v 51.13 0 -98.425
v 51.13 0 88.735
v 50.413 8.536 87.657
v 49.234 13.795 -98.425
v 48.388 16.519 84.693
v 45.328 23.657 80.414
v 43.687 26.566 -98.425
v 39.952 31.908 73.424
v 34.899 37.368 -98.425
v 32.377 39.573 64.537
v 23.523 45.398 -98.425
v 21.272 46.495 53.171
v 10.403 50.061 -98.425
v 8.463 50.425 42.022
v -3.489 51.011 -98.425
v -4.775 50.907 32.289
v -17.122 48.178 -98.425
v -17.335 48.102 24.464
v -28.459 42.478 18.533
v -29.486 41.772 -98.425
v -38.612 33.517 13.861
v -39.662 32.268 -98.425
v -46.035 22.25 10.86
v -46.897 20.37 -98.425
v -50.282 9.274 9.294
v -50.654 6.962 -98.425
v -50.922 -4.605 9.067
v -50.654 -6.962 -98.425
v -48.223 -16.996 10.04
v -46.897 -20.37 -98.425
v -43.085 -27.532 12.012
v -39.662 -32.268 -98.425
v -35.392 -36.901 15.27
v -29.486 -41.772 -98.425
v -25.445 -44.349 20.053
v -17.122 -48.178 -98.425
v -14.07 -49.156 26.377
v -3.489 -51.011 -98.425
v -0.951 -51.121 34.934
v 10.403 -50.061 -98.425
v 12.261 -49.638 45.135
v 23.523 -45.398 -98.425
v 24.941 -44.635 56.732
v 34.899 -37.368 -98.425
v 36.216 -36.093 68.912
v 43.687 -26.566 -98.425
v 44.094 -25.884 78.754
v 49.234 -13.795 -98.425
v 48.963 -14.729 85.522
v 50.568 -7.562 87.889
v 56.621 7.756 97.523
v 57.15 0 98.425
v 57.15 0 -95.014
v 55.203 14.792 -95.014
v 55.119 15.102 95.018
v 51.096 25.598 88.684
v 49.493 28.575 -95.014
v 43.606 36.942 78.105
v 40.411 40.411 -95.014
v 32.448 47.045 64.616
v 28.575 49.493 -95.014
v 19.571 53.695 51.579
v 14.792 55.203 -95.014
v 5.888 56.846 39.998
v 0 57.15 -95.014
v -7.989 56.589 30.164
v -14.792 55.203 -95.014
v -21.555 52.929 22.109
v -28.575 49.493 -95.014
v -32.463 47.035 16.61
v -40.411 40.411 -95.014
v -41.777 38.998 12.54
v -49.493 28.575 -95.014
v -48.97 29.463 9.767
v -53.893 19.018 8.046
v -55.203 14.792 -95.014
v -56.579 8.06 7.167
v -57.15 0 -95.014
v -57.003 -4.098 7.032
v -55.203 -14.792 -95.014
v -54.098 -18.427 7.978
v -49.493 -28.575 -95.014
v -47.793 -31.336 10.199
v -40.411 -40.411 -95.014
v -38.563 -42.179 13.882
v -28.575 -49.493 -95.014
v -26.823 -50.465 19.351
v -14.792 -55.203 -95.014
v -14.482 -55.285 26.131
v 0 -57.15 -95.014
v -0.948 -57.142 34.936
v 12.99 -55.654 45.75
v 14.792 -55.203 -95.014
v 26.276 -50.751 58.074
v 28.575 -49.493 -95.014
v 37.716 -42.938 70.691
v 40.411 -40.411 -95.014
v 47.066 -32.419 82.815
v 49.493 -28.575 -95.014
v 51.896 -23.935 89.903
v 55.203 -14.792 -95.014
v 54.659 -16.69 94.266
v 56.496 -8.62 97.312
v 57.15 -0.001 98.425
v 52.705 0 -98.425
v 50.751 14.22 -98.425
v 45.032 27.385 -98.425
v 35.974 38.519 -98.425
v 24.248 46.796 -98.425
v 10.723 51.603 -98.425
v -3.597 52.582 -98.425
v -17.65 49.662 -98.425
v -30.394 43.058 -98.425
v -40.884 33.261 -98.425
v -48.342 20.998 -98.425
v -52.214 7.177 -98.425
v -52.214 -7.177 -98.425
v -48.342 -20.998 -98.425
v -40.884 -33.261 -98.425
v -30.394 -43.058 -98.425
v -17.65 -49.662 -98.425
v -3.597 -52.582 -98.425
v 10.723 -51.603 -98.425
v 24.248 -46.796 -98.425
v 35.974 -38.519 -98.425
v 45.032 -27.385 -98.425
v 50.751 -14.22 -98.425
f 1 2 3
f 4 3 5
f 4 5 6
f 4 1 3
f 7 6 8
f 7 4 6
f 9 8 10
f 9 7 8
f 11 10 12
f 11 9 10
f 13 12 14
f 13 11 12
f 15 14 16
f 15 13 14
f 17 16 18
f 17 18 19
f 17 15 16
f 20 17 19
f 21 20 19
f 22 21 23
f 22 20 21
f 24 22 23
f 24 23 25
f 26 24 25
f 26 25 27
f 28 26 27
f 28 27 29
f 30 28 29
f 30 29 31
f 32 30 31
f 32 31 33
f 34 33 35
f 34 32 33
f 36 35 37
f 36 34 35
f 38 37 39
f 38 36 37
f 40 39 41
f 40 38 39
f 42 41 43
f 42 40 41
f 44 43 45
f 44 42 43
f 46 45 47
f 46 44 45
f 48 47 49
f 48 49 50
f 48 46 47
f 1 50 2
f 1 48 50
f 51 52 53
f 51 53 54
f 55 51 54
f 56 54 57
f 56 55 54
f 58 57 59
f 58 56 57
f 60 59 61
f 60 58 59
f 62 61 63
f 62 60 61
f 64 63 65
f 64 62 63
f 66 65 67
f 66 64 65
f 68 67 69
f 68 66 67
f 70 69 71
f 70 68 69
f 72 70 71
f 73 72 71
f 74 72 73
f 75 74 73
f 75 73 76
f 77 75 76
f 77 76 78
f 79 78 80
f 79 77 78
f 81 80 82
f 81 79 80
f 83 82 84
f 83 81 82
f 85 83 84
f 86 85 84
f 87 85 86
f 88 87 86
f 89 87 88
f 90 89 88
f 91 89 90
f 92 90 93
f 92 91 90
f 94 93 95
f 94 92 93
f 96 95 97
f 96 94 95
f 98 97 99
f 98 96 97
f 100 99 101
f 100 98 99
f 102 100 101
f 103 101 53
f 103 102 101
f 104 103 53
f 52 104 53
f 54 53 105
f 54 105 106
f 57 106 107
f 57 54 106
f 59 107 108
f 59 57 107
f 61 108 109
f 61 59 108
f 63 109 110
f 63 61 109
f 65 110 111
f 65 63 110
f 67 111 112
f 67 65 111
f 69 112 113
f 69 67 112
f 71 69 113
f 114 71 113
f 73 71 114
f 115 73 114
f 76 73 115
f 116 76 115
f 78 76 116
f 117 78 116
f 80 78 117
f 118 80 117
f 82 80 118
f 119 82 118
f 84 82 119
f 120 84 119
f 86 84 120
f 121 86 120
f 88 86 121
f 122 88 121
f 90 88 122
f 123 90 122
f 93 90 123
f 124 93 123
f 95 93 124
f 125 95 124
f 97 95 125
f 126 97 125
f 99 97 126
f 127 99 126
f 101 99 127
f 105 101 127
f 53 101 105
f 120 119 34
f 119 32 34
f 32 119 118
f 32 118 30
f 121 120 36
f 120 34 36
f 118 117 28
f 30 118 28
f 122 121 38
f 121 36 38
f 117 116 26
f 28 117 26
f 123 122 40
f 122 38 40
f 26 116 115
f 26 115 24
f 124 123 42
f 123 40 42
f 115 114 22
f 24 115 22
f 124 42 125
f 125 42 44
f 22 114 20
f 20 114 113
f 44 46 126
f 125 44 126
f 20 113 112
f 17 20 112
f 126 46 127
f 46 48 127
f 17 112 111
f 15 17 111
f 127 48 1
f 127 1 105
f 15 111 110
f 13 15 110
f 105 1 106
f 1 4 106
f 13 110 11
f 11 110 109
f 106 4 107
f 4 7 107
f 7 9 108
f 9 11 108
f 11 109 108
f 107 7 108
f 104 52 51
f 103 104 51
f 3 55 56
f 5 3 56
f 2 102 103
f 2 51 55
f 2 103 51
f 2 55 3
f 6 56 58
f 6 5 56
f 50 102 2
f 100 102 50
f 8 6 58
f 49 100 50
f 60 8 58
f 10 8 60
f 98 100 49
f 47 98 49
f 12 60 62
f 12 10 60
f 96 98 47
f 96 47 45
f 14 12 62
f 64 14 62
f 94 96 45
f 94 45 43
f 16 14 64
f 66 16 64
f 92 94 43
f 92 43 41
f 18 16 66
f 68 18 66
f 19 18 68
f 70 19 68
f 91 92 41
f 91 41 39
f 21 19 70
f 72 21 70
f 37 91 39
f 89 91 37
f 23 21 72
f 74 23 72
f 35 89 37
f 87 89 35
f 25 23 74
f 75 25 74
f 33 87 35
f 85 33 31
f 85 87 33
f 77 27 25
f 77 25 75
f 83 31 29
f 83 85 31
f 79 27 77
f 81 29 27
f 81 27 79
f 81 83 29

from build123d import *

# Parameters (mm, degrees)
SKETCH1_R               = 57.15
SKETCH1_R_2             = 51.1302
EXTRUDE1_DEPTH          = 98.425
CUT_EXTRUDE1_DEPTH      = 128.356686613
CUT_EXTRUDE1_DEPTH_BACK = 128.356686613
CHAMFER4_SIZE           = 4.445
CHAMFER4_SIZE2          = 3.410768462


with BuildPart() as part:
    # Sketch1 → Extrude1 (new, symmetric)
    with BuildSketch(Plane.XY):
        Circle(SKETCH1_R)
        Circle(SKETCH1_R_2, mode=Mode.SUBTRACT)
    extrude(amount=EXTRUDE1_DEPTH, both=True)

    # Sketch4 → Cut-Extrude1 (cut, two sides: drawn at the far end of the back side and taken through both)
    with BuildSketch(Plane(origin=(0, 0, 0), x_dir=(1, 0, 0), z_dir=(0, 1, 0)).offset(-CUT_EXTRUDE1_DEPTH_BACK)):
        with BuildLine():
            Line((-57.15, -6.985), (-57.15, -98.425))
            Line((-57.15, -98.425), (57.15, -98.425))
            ThreePointArc((57.15, -98.425), (8.513587702, -42.063015372), (-57.15, -6.985))
        make_face()
    extrude(amount=CUT_EXTRUDE1_DEPTH + CUT_EXTRUDE1_DEPTH_BACK, mode=Mode.SUBTRACT)

    # Chamfer4
    chamfer4_edges = [part.edges().sort_by_distance(p)[0] for p in [
        (-57.15, 0, -98.425),
    ]]
    chamfer4_side = [part.faces().sort_by_distance(p)[0] for p in [
        (-55.533553898, 0, -98.425),
    ]]
    chamfer(chamfer4_edges, length=CHAMFER4_SIZE, length2=CHAMFER4_SIZE2, reference=chamfer4_side[0])


solid = part.part
